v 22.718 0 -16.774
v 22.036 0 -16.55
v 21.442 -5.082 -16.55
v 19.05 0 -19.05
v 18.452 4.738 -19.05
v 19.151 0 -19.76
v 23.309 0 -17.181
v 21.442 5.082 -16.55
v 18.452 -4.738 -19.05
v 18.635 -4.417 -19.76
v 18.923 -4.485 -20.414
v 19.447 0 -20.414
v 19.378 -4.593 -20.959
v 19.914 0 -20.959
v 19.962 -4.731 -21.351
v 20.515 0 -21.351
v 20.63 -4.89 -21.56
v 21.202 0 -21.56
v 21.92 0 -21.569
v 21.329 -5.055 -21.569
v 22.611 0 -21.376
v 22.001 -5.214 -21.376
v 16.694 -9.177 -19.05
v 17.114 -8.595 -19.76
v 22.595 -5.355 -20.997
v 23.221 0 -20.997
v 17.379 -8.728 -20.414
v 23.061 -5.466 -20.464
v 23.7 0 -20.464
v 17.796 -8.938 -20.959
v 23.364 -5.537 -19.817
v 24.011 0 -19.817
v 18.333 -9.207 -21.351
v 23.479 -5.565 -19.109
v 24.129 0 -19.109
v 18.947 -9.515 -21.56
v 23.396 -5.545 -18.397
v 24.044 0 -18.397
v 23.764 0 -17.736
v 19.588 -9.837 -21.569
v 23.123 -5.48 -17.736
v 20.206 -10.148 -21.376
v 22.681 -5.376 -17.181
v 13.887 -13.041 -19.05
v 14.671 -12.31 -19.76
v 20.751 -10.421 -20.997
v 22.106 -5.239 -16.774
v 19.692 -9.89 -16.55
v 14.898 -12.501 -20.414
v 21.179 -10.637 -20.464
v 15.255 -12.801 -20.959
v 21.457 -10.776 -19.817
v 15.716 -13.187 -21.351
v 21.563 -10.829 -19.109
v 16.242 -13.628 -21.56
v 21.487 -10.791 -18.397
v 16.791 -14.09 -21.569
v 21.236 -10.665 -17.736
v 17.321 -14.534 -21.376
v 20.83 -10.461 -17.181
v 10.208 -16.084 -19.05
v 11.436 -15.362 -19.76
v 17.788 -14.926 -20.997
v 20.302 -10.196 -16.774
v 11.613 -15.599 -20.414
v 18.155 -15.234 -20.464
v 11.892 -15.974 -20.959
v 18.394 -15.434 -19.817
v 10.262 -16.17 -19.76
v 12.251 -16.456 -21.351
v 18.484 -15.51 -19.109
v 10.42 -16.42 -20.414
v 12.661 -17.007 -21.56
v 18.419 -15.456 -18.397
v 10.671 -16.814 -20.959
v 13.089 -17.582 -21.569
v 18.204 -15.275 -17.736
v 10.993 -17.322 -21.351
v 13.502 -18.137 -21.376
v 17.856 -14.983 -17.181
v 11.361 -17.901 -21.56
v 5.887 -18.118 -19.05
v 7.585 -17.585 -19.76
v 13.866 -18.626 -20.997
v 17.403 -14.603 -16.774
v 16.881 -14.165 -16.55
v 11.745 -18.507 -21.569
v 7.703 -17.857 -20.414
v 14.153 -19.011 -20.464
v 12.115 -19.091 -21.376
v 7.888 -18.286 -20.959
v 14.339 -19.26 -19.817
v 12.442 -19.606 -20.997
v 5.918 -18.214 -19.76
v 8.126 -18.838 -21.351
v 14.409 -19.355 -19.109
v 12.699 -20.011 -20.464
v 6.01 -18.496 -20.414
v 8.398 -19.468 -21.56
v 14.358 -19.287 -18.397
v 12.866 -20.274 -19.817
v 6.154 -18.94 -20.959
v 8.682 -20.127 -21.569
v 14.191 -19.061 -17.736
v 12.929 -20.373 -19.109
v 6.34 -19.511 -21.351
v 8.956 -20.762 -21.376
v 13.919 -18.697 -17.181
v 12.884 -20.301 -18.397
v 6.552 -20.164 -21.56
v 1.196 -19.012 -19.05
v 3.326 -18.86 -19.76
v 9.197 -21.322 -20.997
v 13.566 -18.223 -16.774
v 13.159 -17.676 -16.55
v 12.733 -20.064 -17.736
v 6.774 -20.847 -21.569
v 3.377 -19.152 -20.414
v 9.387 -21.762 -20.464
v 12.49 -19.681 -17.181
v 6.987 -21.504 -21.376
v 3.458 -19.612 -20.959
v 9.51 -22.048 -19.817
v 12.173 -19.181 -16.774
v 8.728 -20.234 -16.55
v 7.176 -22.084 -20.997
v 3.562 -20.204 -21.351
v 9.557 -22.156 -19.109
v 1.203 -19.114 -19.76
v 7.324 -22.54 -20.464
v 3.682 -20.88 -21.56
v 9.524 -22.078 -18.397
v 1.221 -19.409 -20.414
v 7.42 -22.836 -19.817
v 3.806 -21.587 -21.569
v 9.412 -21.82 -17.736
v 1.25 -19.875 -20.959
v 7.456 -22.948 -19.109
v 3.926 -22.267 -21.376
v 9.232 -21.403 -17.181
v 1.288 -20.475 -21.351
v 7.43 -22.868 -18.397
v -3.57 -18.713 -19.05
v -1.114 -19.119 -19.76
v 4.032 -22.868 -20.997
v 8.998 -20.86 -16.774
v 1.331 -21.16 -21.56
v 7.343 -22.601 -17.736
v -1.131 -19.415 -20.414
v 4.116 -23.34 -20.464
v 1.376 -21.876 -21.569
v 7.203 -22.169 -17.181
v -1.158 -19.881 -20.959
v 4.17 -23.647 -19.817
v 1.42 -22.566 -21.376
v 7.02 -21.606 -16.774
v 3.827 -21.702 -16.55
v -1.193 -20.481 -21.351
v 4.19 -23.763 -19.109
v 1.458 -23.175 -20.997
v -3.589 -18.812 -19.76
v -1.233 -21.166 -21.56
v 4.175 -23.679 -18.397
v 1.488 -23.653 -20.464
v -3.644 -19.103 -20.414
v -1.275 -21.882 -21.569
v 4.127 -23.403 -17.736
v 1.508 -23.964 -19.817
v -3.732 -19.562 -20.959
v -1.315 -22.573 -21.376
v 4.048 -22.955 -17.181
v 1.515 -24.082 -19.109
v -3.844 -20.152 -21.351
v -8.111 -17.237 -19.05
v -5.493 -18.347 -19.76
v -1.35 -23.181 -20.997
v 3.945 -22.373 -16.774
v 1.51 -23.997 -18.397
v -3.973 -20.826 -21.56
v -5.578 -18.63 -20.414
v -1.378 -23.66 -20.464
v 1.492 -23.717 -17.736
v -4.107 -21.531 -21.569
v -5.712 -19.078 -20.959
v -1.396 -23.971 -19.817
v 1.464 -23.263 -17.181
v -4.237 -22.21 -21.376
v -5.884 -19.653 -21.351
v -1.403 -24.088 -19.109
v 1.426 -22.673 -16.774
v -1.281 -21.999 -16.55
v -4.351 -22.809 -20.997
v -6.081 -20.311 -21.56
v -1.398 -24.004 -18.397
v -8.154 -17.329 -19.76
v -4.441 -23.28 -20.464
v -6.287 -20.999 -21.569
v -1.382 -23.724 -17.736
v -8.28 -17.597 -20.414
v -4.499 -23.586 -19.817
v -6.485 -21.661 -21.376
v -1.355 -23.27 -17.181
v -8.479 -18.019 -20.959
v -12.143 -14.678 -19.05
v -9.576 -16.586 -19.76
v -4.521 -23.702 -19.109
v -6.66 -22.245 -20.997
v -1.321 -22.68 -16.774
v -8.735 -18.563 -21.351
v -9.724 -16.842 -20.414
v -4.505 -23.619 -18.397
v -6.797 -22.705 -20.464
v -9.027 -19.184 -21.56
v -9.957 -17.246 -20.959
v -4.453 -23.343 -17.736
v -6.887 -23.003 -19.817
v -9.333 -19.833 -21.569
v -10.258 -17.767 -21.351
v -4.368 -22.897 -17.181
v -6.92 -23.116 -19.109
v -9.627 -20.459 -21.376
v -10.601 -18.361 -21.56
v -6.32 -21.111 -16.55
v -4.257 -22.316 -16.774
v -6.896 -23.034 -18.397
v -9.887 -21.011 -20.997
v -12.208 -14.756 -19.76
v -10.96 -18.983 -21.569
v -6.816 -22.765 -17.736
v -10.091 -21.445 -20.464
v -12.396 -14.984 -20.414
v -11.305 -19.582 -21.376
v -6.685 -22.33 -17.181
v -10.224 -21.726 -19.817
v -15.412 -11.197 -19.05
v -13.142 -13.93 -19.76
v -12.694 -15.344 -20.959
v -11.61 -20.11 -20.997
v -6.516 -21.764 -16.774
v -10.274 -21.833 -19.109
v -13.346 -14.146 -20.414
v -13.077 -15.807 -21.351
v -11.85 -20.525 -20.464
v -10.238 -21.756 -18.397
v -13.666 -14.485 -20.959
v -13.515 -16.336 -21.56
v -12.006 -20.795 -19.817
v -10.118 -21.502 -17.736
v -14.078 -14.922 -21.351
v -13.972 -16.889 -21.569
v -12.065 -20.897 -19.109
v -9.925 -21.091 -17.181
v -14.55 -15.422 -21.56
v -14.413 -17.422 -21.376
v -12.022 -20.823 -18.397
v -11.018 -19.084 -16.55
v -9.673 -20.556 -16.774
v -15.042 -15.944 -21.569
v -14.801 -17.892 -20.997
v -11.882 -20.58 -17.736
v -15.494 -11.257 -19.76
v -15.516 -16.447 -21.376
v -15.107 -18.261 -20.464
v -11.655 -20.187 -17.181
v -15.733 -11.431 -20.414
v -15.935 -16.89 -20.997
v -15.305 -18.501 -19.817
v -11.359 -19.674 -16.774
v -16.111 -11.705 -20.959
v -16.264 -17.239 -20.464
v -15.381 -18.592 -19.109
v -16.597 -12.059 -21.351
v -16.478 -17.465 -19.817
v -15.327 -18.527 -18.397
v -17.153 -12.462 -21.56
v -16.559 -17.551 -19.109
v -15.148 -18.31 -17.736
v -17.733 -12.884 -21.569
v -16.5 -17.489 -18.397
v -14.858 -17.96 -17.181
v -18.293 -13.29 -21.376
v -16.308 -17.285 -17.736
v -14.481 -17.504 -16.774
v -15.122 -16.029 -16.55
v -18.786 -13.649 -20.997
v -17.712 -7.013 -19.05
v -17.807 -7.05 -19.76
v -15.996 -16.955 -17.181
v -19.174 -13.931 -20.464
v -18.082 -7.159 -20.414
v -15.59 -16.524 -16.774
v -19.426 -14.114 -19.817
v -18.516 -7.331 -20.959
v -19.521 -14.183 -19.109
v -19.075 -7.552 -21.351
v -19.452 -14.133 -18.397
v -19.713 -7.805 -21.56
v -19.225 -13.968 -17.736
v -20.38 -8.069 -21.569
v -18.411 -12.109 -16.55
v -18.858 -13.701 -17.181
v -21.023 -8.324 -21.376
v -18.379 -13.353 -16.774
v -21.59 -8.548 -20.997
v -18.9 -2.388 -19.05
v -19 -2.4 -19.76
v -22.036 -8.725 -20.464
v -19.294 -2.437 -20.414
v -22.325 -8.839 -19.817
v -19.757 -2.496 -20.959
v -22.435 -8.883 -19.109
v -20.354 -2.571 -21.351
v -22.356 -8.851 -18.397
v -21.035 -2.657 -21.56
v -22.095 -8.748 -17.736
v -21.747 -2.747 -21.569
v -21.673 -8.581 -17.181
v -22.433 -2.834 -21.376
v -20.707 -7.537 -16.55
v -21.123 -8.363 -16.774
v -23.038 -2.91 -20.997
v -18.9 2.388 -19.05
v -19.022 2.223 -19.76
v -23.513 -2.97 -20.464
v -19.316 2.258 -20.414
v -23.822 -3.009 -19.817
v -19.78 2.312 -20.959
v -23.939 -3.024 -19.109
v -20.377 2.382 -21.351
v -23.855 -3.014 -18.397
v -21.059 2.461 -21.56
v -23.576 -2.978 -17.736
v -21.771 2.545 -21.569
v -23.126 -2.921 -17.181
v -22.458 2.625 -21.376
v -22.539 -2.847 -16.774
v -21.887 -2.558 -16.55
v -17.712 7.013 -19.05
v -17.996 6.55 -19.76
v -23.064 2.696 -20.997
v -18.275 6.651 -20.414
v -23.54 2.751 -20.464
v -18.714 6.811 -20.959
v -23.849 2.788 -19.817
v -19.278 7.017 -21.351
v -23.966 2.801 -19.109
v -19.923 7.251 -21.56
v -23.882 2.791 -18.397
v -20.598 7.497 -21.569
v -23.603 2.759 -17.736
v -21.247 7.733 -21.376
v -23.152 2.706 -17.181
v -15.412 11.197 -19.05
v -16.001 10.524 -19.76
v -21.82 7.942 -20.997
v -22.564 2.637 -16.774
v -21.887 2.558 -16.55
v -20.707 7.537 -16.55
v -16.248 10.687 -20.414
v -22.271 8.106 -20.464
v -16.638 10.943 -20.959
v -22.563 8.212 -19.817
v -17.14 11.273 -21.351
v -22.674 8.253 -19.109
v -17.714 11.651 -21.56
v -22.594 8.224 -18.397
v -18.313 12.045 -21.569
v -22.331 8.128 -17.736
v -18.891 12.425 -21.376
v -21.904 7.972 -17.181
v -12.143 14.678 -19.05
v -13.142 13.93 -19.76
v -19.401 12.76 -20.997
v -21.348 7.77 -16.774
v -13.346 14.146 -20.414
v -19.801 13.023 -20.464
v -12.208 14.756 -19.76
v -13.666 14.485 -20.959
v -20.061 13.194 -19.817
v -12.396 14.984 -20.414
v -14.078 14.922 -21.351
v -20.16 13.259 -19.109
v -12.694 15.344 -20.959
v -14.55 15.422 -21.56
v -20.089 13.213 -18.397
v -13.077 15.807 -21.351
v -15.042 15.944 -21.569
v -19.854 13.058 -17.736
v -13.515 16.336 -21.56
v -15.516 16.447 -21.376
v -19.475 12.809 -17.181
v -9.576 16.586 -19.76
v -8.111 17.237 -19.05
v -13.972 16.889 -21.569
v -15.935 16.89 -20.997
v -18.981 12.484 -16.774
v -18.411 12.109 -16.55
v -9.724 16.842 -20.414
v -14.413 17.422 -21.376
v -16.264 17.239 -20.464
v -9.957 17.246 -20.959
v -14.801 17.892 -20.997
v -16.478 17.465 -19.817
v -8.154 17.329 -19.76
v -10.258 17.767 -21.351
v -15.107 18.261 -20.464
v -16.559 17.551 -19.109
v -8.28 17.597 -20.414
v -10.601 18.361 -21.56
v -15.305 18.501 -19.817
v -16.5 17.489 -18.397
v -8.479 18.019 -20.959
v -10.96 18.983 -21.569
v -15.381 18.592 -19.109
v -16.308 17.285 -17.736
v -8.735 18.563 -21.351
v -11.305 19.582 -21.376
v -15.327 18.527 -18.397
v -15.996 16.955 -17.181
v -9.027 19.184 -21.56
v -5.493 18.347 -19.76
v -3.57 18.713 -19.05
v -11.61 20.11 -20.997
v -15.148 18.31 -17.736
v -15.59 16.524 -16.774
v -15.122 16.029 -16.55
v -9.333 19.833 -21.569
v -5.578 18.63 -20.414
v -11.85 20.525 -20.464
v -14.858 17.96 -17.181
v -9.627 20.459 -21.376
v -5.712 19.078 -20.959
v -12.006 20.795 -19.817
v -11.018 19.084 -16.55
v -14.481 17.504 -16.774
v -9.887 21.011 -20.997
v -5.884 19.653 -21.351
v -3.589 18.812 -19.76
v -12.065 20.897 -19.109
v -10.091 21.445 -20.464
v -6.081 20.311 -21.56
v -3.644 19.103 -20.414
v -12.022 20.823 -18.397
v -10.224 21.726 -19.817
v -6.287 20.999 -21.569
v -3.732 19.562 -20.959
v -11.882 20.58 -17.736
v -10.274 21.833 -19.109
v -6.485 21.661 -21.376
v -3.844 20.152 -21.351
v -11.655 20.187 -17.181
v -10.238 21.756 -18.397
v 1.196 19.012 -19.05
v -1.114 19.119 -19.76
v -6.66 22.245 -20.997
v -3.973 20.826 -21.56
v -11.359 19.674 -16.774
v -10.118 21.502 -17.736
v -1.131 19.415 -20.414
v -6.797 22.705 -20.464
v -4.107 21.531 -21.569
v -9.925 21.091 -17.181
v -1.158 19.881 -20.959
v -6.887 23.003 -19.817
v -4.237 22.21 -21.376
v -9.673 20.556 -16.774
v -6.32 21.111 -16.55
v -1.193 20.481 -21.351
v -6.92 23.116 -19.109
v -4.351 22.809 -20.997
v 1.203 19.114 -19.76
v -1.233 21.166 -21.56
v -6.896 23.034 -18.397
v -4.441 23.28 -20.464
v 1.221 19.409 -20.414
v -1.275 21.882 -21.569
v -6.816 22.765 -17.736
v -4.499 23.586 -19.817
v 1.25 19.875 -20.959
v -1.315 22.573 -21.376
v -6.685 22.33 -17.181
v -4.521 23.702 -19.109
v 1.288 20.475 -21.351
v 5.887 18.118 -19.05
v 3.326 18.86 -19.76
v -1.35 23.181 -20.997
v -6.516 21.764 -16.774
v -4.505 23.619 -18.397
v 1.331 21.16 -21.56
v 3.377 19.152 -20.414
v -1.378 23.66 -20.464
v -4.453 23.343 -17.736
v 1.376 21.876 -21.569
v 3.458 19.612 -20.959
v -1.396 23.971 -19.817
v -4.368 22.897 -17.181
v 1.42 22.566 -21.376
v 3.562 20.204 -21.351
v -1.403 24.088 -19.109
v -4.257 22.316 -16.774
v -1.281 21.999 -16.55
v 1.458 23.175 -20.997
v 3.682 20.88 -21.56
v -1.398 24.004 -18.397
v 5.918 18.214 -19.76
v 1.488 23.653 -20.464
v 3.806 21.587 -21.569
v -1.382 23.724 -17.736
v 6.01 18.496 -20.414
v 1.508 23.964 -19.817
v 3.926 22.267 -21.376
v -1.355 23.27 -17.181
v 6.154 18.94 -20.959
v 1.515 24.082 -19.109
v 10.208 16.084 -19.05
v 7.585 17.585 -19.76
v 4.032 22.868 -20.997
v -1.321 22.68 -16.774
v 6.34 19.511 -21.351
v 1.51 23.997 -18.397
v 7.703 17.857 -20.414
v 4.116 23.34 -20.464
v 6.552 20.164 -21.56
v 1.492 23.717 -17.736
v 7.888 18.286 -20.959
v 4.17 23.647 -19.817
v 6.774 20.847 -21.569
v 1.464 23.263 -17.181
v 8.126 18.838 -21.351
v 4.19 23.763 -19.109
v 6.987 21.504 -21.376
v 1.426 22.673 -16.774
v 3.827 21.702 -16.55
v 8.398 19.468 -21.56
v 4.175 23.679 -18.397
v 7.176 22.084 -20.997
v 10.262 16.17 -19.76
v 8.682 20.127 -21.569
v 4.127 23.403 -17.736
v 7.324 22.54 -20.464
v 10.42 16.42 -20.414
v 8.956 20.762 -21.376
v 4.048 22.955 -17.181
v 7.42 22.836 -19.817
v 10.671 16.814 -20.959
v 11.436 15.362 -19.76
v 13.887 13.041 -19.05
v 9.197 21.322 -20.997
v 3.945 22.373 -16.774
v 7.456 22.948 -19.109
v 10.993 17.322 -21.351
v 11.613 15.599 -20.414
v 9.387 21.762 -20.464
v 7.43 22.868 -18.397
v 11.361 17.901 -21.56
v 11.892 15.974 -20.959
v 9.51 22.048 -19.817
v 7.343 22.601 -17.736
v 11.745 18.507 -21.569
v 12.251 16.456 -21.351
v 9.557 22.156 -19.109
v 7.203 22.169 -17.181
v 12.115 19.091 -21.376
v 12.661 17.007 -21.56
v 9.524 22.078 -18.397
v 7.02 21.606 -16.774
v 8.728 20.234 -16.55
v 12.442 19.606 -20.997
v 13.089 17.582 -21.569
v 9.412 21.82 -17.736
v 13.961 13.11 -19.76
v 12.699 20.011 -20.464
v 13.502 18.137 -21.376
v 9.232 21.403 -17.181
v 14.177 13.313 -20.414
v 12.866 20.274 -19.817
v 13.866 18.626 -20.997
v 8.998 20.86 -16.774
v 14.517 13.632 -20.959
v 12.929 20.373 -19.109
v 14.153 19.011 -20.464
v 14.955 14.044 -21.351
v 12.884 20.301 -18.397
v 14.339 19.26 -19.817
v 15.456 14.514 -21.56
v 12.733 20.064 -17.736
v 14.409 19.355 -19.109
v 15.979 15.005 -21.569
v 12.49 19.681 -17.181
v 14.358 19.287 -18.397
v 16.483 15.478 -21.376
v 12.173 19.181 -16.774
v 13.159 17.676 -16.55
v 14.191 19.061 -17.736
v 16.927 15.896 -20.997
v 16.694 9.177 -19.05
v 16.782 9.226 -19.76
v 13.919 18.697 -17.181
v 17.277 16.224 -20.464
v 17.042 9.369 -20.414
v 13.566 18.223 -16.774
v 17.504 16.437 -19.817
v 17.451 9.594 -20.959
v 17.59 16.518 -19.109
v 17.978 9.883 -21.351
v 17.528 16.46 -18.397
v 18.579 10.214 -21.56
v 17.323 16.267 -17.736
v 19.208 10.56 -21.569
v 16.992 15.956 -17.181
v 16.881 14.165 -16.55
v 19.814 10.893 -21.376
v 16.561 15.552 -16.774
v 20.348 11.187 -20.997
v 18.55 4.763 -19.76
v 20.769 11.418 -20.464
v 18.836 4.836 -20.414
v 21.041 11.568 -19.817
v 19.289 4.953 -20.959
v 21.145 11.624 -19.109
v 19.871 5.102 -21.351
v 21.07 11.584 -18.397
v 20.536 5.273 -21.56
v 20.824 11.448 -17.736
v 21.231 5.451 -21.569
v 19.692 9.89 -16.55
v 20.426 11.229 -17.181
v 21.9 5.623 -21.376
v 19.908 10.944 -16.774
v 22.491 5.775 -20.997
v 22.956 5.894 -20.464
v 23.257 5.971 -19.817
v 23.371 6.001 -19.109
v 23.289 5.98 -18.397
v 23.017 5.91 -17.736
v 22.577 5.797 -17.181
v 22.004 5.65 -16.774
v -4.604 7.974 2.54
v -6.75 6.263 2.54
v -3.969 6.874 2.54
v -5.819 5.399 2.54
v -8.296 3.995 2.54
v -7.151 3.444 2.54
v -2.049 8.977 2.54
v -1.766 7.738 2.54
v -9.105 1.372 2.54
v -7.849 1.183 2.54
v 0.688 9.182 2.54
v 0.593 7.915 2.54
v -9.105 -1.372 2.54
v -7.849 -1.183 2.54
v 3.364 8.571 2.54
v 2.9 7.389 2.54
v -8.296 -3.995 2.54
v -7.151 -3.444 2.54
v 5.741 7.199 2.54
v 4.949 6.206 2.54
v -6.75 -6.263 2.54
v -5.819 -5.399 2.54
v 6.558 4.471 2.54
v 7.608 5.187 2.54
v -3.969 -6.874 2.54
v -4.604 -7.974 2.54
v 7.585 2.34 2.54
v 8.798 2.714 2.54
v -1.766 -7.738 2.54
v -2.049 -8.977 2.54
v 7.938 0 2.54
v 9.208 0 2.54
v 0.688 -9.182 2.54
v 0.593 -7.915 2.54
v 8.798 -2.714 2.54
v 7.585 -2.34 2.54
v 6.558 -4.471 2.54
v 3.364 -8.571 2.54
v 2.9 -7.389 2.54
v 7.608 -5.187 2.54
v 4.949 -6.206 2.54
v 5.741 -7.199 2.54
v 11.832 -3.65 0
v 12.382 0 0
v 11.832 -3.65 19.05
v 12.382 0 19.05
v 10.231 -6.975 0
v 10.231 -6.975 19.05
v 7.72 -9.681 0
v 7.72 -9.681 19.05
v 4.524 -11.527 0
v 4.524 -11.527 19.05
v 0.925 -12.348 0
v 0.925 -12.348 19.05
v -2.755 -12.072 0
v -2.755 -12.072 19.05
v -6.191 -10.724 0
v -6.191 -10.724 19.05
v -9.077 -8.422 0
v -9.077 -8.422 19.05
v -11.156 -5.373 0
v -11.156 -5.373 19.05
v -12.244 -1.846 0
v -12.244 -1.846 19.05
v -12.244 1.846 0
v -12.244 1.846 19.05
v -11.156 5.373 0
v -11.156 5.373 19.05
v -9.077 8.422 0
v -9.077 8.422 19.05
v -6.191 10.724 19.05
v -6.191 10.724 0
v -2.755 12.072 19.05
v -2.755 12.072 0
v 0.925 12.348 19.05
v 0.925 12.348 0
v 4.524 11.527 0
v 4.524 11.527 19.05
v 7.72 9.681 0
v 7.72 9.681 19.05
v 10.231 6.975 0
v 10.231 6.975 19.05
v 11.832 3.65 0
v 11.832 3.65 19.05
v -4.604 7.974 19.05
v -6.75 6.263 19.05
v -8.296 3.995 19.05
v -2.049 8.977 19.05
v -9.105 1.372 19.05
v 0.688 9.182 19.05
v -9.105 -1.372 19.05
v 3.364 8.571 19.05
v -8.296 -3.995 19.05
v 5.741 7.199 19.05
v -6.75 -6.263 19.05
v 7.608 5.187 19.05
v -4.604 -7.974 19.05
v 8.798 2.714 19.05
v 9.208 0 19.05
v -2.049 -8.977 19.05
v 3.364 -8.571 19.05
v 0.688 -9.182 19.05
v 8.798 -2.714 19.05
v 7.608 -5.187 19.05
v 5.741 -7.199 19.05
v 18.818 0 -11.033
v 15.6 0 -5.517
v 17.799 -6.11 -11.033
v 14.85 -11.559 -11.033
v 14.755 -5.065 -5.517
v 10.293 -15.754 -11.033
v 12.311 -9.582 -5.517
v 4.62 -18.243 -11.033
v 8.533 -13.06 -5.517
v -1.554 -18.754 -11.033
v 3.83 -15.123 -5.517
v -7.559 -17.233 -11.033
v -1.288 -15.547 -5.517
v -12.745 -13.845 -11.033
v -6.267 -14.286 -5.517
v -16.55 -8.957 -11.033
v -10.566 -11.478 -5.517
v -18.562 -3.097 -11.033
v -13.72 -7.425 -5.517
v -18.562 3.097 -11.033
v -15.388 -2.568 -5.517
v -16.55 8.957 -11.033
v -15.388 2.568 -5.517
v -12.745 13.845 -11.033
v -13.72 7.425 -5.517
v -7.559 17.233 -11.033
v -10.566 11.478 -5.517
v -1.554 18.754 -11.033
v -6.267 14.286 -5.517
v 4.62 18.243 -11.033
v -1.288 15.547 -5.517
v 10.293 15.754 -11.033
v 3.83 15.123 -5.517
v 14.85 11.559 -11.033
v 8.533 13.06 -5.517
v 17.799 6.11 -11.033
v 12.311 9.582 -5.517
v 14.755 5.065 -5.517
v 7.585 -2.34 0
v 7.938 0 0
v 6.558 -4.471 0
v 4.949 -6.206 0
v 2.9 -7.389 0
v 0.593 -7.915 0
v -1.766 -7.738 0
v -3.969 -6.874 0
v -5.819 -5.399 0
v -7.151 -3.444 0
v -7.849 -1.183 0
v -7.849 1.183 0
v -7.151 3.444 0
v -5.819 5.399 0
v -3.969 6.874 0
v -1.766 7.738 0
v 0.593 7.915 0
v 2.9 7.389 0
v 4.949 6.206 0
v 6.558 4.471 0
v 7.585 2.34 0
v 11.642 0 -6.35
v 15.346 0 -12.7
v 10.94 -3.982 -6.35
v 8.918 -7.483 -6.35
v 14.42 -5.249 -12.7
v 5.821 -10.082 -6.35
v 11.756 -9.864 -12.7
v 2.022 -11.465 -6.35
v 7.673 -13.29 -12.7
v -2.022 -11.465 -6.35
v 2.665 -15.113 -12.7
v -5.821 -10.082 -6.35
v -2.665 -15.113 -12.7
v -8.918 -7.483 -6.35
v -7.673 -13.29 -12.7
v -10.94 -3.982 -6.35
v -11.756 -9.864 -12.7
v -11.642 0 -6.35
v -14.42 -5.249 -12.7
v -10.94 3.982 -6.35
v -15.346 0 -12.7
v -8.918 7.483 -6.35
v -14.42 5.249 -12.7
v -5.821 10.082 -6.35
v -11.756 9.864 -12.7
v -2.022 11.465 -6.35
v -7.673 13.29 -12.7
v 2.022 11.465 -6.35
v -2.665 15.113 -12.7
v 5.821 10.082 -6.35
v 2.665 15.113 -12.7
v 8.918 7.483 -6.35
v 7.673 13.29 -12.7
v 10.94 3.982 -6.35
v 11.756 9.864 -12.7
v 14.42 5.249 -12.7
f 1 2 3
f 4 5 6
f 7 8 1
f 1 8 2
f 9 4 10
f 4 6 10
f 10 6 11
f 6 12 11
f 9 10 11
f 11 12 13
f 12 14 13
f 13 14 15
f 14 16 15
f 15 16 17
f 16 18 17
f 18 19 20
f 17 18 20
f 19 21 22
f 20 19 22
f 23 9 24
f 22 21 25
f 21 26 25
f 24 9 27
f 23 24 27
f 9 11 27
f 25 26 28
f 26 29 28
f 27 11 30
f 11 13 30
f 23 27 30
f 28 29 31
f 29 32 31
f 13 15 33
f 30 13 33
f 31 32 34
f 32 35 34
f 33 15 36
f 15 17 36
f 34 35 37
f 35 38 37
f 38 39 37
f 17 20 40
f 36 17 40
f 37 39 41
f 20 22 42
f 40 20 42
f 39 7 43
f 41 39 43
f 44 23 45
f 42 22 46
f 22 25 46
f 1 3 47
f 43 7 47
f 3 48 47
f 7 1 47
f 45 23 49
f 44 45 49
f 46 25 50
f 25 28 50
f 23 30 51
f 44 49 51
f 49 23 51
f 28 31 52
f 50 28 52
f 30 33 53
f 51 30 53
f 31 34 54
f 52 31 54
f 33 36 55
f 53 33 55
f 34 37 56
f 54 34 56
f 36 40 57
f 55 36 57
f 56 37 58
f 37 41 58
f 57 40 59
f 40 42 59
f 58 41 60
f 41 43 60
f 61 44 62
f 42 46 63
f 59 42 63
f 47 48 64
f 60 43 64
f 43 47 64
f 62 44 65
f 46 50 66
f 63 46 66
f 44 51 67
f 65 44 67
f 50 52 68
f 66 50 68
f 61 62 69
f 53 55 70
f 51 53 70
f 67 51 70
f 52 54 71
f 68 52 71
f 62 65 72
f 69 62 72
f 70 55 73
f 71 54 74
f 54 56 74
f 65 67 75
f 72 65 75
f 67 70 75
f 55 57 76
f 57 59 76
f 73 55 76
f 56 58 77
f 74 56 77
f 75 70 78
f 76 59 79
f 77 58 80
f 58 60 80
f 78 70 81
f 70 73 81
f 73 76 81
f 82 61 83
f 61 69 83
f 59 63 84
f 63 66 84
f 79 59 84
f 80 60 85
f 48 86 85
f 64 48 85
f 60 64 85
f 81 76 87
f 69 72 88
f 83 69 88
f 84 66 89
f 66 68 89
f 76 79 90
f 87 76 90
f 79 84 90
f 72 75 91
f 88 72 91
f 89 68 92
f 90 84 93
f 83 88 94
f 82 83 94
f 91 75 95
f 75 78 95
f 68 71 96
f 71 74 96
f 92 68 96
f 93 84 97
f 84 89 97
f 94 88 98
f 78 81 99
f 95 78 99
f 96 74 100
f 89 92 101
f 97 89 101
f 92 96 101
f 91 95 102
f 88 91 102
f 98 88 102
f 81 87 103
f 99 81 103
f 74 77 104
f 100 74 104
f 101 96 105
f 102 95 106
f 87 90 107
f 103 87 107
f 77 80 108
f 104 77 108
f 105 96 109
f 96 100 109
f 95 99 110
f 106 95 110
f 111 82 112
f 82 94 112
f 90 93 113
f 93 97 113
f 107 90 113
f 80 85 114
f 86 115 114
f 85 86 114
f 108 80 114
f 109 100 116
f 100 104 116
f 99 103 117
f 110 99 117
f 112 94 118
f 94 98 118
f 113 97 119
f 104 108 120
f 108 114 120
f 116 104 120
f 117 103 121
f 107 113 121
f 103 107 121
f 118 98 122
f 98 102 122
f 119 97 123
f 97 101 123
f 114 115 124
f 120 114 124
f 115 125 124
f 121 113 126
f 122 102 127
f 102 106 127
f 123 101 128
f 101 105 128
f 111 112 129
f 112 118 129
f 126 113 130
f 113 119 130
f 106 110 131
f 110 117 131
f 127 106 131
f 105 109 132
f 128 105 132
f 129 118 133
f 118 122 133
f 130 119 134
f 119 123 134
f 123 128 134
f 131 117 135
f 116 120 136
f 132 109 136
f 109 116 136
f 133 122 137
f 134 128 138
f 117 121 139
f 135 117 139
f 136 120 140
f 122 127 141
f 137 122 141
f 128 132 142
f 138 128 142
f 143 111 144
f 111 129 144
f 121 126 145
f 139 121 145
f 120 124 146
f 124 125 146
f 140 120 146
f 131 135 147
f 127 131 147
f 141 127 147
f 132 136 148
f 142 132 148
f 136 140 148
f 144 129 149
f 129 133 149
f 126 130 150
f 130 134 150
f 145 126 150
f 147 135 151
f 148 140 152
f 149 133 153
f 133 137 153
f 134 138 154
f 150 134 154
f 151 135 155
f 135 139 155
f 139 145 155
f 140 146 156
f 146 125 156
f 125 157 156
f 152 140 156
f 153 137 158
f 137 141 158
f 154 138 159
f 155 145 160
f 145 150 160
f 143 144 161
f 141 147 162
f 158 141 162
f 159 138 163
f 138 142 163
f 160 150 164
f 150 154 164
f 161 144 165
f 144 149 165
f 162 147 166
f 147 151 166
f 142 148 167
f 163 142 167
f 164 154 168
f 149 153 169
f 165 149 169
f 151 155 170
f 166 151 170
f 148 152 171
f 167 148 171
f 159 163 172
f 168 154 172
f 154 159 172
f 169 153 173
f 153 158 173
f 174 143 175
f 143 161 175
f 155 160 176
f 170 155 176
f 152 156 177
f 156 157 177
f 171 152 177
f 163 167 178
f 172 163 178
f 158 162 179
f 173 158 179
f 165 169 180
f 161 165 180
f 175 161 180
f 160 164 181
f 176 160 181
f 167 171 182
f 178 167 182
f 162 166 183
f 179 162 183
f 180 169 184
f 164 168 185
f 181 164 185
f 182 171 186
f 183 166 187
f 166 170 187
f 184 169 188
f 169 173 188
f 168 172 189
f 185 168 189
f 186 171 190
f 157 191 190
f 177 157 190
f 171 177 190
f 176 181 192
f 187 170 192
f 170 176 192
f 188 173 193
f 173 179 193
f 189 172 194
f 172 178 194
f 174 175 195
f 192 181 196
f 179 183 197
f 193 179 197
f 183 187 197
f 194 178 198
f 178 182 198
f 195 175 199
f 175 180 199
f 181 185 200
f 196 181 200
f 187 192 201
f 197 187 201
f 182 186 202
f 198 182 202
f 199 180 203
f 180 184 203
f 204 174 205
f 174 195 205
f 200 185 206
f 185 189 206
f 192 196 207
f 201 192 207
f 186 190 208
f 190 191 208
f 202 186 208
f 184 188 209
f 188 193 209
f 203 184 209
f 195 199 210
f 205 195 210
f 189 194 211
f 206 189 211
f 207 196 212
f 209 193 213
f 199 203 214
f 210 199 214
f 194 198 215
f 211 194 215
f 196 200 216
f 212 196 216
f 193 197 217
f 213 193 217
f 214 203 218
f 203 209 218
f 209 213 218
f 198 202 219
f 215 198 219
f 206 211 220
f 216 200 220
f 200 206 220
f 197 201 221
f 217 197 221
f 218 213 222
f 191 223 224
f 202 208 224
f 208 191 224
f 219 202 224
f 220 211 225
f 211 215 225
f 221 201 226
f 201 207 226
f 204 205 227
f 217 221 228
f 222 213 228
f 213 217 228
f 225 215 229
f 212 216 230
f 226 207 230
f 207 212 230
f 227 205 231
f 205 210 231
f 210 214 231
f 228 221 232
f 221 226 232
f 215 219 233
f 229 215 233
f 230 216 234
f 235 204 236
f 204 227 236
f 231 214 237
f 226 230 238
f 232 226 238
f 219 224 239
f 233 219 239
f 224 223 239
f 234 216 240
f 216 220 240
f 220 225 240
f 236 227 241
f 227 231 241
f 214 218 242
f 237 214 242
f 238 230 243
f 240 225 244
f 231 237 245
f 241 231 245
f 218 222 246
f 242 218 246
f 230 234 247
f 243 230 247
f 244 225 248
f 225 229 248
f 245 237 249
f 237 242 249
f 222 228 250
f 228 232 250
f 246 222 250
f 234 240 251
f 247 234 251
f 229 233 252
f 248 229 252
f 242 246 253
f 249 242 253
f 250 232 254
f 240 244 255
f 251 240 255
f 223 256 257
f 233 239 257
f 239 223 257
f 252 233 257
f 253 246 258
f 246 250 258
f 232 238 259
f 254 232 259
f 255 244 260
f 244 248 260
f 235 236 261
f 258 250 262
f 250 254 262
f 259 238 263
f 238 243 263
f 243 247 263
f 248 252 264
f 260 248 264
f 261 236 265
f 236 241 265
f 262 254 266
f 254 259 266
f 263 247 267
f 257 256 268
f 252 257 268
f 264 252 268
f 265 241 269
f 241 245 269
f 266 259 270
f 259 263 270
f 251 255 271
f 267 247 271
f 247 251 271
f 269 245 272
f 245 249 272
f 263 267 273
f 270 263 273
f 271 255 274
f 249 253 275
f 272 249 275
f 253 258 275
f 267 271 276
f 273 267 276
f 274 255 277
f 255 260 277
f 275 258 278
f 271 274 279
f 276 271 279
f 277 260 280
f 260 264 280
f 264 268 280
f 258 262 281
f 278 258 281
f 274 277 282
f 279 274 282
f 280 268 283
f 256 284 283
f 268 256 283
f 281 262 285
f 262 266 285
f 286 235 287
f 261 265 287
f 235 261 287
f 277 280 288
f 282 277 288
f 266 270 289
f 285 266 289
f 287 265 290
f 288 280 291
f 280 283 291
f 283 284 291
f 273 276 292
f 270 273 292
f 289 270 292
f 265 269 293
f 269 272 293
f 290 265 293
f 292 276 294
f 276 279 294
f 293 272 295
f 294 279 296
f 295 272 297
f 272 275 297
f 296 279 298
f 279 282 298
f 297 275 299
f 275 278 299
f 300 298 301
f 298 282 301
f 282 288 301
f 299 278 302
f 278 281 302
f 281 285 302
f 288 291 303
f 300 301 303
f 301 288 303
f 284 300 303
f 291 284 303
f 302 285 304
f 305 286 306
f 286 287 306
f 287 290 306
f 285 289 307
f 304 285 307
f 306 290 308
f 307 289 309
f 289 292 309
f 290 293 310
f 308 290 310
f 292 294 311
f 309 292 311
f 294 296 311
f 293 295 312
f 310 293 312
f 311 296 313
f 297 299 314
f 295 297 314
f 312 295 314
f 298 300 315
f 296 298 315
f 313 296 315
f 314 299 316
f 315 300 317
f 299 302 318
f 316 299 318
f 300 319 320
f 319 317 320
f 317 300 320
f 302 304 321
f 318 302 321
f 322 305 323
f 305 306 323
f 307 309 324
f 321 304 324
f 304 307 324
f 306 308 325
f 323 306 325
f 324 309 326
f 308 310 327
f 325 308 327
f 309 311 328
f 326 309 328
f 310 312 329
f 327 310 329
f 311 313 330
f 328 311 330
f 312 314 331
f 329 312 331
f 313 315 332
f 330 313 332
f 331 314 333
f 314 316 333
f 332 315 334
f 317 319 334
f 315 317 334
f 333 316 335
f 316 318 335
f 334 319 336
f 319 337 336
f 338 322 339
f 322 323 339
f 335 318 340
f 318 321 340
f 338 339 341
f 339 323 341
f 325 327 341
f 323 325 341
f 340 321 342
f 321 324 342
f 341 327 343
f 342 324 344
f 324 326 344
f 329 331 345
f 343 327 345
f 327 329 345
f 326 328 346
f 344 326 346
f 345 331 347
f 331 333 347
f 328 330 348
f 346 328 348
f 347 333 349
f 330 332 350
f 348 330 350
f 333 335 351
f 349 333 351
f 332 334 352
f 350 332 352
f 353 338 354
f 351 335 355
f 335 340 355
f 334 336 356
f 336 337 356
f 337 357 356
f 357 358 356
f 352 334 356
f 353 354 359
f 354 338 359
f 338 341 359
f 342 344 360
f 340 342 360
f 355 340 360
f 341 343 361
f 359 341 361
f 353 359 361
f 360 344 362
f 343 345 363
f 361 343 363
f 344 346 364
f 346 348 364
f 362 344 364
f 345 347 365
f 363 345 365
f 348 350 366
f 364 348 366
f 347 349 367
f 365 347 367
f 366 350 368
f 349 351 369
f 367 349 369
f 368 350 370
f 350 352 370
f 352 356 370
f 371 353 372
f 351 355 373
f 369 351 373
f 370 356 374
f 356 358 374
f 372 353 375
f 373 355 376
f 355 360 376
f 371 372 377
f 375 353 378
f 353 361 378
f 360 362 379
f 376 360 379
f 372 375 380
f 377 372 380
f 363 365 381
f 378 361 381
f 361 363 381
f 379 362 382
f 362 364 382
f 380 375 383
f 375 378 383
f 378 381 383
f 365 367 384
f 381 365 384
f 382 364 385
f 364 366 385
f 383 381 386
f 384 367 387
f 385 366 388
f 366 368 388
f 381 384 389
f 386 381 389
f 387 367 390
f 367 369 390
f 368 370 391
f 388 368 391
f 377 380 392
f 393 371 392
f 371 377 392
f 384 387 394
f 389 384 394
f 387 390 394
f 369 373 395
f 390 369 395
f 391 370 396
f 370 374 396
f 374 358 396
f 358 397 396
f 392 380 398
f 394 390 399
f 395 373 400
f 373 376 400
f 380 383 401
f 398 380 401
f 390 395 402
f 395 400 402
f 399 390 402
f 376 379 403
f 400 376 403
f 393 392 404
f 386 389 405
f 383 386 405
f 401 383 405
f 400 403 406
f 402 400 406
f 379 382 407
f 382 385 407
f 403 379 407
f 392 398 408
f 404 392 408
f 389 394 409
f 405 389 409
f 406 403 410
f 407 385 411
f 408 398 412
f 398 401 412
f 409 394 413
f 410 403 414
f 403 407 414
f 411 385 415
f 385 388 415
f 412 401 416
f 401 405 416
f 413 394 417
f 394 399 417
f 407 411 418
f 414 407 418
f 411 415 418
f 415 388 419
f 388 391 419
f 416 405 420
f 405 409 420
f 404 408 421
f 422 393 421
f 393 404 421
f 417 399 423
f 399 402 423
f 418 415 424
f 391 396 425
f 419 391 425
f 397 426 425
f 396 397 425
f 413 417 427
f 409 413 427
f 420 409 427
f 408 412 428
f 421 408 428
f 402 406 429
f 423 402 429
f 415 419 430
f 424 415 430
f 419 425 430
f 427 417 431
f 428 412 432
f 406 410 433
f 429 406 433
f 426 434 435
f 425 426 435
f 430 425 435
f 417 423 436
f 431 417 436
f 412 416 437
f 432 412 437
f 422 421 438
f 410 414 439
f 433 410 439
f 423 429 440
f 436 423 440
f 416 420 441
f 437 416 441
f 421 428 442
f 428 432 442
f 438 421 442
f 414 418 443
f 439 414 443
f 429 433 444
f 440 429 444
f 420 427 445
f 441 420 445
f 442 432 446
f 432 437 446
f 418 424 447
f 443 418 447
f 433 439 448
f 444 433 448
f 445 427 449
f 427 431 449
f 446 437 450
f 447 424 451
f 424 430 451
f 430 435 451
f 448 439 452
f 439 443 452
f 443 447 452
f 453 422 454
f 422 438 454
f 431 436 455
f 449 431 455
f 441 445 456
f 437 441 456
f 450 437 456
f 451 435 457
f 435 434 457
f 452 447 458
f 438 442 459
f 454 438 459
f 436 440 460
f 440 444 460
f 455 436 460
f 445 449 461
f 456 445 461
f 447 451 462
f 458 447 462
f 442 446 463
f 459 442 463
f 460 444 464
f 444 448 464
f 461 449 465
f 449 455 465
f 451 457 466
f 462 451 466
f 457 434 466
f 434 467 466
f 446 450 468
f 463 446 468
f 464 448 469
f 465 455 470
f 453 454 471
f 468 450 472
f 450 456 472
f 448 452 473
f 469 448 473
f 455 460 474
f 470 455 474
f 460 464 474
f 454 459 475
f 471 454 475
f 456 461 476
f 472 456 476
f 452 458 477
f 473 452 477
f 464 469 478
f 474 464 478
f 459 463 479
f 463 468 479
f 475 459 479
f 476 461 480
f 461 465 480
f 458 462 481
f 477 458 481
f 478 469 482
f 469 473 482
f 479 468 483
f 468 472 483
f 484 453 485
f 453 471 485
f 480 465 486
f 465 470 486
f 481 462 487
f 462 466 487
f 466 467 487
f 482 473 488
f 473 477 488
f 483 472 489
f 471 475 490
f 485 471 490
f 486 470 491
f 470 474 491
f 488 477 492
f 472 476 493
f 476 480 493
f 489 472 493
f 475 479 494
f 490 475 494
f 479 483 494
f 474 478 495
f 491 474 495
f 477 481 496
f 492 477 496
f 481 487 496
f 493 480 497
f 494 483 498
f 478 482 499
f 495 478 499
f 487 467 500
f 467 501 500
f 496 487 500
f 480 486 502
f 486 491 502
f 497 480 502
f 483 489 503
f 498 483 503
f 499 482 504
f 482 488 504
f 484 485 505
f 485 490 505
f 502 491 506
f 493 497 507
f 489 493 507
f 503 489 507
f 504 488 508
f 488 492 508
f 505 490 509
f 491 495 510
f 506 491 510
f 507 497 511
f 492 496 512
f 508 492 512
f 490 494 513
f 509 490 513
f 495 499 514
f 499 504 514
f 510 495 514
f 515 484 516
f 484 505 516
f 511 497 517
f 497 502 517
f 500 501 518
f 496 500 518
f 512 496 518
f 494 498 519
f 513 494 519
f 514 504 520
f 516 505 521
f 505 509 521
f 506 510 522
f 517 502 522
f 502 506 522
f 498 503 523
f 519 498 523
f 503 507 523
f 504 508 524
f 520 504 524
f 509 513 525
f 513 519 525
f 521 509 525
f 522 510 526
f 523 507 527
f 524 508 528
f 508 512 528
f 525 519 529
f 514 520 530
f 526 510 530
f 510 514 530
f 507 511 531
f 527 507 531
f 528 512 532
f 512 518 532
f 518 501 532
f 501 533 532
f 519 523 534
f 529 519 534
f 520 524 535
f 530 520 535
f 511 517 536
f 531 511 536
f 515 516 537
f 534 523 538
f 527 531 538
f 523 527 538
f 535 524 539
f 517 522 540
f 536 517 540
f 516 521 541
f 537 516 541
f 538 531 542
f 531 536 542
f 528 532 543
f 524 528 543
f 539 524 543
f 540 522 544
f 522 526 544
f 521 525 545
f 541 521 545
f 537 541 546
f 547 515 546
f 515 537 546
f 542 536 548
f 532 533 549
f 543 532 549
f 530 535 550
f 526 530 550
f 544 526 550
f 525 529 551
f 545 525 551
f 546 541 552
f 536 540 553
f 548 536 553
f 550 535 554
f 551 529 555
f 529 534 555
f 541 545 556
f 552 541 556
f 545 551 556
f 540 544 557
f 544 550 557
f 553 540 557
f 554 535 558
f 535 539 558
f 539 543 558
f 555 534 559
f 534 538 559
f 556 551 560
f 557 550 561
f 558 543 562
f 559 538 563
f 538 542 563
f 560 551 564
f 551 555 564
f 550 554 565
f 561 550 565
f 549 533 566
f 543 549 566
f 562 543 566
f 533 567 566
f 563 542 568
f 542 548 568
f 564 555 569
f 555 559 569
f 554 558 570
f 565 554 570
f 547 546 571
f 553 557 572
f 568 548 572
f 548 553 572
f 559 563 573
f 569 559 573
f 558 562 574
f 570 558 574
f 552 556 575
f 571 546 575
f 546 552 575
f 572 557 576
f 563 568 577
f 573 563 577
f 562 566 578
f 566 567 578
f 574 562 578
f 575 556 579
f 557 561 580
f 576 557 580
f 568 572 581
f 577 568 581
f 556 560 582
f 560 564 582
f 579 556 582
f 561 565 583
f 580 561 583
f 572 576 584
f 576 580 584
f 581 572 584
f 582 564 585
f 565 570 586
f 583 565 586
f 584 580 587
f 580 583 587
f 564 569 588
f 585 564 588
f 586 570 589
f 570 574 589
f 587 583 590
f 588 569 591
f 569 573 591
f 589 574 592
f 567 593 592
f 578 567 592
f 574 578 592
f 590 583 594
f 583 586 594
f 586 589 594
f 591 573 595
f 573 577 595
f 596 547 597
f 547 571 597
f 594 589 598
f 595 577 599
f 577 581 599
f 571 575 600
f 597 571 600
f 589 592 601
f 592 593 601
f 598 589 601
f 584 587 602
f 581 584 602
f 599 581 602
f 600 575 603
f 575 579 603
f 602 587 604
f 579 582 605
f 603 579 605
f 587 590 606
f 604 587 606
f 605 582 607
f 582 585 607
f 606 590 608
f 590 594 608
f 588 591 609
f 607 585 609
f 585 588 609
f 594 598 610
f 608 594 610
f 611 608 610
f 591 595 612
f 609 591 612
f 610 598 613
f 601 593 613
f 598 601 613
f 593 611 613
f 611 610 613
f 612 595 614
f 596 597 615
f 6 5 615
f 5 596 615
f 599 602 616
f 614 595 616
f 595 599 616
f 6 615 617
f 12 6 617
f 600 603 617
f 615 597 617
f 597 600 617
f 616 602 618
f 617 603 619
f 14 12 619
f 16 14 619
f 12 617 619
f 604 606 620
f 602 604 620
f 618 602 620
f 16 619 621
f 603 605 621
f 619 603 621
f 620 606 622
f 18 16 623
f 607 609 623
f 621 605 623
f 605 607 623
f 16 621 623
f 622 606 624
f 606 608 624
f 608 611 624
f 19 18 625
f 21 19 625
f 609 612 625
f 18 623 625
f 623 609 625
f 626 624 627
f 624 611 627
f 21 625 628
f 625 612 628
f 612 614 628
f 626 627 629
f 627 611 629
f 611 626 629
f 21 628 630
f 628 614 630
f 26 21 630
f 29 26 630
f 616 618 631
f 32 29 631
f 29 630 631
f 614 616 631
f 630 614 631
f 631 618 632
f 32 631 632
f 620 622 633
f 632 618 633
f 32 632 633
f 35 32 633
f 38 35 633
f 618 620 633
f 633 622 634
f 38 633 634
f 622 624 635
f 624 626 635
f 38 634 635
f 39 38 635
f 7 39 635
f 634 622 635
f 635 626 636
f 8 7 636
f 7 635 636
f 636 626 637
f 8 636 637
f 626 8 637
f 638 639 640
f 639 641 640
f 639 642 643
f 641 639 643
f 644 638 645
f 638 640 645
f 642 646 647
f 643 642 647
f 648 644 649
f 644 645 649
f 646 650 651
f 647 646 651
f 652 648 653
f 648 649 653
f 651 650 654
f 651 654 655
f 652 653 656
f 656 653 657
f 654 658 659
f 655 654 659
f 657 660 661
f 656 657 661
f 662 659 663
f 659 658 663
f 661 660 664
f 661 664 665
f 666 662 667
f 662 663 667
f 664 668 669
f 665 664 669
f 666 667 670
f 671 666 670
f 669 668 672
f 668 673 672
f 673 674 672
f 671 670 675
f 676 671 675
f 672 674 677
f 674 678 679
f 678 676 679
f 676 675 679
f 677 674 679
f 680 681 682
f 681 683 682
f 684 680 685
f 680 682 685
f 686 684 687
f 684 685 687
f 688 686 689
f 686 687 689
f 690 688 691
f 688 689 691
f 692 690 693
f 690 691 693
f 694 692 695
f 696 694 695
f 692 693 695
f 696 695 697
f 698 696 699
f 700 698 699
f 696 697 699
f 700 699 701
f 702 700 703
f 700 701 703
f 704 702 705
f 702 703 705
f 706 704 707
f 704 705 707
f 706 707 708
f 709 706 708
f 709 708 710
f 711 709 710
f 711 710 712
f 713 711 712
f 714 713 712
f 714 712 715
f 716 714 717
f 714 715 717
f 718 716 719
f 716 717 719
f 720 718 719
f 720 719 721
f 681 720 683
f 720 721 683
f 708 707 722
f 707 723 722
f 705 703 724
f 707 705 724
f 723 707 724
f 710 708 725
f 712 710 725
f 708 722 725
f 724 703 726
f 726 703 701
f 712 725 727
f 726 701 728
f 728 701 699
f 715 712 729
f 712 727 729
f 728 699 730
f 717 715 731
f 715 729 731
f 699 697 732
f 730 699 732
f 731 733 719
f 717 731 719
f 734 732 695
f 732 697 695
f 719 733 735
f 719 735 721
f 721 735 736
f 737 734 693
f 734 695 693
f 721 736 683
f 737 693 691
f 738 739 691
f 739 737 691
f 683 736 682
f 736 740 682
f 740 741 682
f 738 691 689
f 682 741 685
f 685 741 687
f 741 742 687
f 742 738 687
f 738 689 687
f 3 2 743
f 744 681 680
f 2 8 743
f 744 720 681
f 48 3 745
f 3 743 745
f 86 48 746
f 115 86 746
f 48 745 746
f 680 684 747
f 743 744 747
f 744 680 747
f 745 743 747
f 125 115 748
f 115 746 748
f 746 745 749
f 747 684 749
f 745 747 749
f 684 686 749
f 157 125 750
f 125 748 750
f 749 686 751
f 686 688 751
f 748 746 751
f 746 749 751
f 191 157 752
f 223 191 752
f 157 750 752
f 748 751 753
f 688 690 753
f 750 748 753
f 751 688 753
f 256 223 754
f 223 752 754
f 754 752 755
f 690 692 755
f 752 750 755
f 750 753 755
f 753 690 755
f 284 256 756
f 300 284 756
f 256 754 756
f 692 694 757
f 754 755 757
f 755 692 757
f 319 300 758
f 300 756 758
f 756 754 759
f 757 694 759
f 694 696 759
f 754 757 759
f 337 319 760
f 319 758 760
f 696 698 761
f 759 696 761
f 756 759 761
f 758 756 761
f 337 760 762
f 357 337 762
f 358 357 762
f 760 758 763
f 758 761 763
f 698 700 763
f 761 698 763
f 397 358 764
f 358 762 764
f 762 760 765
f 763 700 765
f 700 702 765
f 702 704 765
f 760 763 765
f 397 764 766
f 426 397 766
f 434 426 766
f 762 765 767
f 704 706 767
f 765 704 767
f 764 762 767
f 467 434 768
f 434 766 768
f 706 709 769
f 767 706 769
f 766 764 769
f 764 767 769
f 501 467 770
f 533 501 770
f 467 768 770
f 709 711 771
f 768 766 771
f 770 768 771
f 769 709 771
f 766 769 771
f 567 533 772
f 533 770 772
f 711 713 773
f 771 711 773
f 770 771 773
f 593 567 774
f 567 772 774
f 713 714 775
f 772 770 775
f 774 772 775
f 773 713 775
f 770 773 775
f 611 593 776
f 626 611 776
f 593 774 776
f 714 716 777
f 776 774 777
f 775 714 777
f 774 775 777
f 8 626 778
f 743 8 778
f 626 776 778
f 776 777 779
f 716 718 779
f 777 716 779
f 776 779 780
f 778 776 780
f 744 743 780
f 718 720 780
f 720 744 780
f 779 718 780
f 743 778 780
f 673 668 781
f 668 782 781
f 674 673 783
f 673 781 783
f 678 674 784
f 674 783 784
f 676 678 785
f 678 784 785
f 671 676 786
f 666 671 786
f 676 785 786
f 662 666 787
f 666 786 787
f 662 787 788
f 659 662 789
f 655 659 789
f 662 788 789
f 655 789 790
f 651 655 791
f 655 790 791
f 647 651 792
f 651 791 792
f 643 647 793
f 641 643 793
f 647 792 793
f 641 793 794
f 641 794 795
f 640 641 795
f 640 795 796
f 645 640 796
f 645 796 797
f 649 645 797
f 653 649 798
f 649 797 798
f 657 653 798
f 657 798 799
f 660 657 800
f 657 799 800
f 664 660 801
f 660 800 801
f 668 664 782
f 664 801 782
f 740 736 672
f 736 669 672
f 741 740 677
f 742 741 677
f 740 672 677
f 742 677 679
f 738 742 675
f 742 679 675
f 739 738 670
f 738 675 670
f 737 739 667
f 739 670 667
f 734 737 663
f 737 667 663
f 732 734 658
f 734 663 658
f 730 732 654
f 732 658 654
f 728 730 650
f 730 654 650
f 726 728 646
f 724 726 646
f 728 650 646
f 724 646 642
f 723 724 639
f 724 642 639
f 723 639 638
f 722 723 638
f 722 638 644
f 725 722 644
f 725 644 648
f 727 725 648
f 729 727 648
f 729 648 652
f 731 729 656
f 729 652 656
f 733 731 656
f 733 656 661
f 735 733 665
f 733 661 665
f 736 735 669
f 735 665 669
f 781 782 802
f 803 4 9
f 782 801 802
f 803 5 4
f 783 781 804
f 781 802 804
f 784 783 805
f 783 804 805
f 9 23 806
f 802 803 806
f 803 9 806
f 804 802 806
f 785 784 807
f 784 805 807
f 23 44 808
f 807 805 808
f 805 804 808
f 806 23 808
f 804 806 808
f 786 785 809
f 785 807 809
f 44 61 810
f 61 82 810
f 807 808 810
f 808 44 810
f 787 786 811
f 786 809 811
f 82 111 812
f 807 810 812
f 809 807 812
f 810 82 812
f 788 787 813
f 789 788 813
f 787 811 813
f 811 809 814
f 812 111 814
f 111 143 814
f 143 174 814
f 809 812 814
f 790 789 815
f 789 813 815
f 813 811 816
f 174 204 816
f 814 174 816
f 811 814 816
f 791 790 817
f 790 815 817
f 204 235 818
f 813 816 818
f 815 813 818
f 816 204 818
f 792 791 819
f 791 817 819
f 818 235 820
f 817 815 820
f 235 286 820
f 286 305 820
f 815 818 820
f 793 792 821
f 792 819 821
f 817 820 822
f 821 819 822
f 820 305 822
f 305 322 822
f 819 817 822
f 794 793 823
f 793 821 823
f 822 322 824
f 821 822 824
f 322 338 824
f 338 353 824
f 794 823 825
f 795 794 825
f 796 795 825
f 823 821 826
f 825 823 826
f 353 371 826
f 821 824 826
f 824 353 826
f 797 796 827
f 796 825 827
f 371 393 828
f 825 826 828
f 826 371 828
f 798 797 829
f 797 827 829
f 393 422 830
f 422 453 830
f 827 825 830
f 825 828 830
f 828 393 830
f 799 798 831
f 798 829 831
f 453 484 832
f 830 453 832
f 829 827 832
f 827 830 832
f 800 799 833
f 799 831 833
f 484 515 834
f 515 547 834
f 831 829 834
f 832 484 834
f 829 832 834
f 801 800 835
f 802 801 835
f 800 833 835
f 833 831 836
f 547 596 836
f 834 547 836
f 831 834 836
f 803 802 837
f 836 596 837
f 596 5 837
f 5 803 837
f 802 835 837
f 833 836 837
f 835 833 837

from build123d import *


# Not quite as in the source:
# - a feature names something its author has since deleted; it is built from what else it names


with BuildPart() as f1:
    # F0 (on Front) → F1 (revolve)
    with BuildSketch(Plane.XZ):
        with BuildLine():
            Line((9.2075, 19.05), (9.2075, 2.54))
            Line((9.2075, 2.54), (7.9375, 2.54))
            Line((7.9375, 2.54), (7.9375, 0))
            Line((7.9375, 0), (19.05, -19.05))
            ThreePointArc((19.05, -19.05), (23.2206068806, -20.9974910015), (22.0363946464, -16.5495336796))
            Line((22.0363946464, -16.5495336796), (12.3825, 0))
            Line((12.3825, 0), (12.3825, 19.05))
            Line((12.3825, 19.05), (9.2075, 19.05))
        make_face()
    revolve(axis=Axis((0, 0, -5.8383159339), (0, 0, -1)))


solid = f1.part
